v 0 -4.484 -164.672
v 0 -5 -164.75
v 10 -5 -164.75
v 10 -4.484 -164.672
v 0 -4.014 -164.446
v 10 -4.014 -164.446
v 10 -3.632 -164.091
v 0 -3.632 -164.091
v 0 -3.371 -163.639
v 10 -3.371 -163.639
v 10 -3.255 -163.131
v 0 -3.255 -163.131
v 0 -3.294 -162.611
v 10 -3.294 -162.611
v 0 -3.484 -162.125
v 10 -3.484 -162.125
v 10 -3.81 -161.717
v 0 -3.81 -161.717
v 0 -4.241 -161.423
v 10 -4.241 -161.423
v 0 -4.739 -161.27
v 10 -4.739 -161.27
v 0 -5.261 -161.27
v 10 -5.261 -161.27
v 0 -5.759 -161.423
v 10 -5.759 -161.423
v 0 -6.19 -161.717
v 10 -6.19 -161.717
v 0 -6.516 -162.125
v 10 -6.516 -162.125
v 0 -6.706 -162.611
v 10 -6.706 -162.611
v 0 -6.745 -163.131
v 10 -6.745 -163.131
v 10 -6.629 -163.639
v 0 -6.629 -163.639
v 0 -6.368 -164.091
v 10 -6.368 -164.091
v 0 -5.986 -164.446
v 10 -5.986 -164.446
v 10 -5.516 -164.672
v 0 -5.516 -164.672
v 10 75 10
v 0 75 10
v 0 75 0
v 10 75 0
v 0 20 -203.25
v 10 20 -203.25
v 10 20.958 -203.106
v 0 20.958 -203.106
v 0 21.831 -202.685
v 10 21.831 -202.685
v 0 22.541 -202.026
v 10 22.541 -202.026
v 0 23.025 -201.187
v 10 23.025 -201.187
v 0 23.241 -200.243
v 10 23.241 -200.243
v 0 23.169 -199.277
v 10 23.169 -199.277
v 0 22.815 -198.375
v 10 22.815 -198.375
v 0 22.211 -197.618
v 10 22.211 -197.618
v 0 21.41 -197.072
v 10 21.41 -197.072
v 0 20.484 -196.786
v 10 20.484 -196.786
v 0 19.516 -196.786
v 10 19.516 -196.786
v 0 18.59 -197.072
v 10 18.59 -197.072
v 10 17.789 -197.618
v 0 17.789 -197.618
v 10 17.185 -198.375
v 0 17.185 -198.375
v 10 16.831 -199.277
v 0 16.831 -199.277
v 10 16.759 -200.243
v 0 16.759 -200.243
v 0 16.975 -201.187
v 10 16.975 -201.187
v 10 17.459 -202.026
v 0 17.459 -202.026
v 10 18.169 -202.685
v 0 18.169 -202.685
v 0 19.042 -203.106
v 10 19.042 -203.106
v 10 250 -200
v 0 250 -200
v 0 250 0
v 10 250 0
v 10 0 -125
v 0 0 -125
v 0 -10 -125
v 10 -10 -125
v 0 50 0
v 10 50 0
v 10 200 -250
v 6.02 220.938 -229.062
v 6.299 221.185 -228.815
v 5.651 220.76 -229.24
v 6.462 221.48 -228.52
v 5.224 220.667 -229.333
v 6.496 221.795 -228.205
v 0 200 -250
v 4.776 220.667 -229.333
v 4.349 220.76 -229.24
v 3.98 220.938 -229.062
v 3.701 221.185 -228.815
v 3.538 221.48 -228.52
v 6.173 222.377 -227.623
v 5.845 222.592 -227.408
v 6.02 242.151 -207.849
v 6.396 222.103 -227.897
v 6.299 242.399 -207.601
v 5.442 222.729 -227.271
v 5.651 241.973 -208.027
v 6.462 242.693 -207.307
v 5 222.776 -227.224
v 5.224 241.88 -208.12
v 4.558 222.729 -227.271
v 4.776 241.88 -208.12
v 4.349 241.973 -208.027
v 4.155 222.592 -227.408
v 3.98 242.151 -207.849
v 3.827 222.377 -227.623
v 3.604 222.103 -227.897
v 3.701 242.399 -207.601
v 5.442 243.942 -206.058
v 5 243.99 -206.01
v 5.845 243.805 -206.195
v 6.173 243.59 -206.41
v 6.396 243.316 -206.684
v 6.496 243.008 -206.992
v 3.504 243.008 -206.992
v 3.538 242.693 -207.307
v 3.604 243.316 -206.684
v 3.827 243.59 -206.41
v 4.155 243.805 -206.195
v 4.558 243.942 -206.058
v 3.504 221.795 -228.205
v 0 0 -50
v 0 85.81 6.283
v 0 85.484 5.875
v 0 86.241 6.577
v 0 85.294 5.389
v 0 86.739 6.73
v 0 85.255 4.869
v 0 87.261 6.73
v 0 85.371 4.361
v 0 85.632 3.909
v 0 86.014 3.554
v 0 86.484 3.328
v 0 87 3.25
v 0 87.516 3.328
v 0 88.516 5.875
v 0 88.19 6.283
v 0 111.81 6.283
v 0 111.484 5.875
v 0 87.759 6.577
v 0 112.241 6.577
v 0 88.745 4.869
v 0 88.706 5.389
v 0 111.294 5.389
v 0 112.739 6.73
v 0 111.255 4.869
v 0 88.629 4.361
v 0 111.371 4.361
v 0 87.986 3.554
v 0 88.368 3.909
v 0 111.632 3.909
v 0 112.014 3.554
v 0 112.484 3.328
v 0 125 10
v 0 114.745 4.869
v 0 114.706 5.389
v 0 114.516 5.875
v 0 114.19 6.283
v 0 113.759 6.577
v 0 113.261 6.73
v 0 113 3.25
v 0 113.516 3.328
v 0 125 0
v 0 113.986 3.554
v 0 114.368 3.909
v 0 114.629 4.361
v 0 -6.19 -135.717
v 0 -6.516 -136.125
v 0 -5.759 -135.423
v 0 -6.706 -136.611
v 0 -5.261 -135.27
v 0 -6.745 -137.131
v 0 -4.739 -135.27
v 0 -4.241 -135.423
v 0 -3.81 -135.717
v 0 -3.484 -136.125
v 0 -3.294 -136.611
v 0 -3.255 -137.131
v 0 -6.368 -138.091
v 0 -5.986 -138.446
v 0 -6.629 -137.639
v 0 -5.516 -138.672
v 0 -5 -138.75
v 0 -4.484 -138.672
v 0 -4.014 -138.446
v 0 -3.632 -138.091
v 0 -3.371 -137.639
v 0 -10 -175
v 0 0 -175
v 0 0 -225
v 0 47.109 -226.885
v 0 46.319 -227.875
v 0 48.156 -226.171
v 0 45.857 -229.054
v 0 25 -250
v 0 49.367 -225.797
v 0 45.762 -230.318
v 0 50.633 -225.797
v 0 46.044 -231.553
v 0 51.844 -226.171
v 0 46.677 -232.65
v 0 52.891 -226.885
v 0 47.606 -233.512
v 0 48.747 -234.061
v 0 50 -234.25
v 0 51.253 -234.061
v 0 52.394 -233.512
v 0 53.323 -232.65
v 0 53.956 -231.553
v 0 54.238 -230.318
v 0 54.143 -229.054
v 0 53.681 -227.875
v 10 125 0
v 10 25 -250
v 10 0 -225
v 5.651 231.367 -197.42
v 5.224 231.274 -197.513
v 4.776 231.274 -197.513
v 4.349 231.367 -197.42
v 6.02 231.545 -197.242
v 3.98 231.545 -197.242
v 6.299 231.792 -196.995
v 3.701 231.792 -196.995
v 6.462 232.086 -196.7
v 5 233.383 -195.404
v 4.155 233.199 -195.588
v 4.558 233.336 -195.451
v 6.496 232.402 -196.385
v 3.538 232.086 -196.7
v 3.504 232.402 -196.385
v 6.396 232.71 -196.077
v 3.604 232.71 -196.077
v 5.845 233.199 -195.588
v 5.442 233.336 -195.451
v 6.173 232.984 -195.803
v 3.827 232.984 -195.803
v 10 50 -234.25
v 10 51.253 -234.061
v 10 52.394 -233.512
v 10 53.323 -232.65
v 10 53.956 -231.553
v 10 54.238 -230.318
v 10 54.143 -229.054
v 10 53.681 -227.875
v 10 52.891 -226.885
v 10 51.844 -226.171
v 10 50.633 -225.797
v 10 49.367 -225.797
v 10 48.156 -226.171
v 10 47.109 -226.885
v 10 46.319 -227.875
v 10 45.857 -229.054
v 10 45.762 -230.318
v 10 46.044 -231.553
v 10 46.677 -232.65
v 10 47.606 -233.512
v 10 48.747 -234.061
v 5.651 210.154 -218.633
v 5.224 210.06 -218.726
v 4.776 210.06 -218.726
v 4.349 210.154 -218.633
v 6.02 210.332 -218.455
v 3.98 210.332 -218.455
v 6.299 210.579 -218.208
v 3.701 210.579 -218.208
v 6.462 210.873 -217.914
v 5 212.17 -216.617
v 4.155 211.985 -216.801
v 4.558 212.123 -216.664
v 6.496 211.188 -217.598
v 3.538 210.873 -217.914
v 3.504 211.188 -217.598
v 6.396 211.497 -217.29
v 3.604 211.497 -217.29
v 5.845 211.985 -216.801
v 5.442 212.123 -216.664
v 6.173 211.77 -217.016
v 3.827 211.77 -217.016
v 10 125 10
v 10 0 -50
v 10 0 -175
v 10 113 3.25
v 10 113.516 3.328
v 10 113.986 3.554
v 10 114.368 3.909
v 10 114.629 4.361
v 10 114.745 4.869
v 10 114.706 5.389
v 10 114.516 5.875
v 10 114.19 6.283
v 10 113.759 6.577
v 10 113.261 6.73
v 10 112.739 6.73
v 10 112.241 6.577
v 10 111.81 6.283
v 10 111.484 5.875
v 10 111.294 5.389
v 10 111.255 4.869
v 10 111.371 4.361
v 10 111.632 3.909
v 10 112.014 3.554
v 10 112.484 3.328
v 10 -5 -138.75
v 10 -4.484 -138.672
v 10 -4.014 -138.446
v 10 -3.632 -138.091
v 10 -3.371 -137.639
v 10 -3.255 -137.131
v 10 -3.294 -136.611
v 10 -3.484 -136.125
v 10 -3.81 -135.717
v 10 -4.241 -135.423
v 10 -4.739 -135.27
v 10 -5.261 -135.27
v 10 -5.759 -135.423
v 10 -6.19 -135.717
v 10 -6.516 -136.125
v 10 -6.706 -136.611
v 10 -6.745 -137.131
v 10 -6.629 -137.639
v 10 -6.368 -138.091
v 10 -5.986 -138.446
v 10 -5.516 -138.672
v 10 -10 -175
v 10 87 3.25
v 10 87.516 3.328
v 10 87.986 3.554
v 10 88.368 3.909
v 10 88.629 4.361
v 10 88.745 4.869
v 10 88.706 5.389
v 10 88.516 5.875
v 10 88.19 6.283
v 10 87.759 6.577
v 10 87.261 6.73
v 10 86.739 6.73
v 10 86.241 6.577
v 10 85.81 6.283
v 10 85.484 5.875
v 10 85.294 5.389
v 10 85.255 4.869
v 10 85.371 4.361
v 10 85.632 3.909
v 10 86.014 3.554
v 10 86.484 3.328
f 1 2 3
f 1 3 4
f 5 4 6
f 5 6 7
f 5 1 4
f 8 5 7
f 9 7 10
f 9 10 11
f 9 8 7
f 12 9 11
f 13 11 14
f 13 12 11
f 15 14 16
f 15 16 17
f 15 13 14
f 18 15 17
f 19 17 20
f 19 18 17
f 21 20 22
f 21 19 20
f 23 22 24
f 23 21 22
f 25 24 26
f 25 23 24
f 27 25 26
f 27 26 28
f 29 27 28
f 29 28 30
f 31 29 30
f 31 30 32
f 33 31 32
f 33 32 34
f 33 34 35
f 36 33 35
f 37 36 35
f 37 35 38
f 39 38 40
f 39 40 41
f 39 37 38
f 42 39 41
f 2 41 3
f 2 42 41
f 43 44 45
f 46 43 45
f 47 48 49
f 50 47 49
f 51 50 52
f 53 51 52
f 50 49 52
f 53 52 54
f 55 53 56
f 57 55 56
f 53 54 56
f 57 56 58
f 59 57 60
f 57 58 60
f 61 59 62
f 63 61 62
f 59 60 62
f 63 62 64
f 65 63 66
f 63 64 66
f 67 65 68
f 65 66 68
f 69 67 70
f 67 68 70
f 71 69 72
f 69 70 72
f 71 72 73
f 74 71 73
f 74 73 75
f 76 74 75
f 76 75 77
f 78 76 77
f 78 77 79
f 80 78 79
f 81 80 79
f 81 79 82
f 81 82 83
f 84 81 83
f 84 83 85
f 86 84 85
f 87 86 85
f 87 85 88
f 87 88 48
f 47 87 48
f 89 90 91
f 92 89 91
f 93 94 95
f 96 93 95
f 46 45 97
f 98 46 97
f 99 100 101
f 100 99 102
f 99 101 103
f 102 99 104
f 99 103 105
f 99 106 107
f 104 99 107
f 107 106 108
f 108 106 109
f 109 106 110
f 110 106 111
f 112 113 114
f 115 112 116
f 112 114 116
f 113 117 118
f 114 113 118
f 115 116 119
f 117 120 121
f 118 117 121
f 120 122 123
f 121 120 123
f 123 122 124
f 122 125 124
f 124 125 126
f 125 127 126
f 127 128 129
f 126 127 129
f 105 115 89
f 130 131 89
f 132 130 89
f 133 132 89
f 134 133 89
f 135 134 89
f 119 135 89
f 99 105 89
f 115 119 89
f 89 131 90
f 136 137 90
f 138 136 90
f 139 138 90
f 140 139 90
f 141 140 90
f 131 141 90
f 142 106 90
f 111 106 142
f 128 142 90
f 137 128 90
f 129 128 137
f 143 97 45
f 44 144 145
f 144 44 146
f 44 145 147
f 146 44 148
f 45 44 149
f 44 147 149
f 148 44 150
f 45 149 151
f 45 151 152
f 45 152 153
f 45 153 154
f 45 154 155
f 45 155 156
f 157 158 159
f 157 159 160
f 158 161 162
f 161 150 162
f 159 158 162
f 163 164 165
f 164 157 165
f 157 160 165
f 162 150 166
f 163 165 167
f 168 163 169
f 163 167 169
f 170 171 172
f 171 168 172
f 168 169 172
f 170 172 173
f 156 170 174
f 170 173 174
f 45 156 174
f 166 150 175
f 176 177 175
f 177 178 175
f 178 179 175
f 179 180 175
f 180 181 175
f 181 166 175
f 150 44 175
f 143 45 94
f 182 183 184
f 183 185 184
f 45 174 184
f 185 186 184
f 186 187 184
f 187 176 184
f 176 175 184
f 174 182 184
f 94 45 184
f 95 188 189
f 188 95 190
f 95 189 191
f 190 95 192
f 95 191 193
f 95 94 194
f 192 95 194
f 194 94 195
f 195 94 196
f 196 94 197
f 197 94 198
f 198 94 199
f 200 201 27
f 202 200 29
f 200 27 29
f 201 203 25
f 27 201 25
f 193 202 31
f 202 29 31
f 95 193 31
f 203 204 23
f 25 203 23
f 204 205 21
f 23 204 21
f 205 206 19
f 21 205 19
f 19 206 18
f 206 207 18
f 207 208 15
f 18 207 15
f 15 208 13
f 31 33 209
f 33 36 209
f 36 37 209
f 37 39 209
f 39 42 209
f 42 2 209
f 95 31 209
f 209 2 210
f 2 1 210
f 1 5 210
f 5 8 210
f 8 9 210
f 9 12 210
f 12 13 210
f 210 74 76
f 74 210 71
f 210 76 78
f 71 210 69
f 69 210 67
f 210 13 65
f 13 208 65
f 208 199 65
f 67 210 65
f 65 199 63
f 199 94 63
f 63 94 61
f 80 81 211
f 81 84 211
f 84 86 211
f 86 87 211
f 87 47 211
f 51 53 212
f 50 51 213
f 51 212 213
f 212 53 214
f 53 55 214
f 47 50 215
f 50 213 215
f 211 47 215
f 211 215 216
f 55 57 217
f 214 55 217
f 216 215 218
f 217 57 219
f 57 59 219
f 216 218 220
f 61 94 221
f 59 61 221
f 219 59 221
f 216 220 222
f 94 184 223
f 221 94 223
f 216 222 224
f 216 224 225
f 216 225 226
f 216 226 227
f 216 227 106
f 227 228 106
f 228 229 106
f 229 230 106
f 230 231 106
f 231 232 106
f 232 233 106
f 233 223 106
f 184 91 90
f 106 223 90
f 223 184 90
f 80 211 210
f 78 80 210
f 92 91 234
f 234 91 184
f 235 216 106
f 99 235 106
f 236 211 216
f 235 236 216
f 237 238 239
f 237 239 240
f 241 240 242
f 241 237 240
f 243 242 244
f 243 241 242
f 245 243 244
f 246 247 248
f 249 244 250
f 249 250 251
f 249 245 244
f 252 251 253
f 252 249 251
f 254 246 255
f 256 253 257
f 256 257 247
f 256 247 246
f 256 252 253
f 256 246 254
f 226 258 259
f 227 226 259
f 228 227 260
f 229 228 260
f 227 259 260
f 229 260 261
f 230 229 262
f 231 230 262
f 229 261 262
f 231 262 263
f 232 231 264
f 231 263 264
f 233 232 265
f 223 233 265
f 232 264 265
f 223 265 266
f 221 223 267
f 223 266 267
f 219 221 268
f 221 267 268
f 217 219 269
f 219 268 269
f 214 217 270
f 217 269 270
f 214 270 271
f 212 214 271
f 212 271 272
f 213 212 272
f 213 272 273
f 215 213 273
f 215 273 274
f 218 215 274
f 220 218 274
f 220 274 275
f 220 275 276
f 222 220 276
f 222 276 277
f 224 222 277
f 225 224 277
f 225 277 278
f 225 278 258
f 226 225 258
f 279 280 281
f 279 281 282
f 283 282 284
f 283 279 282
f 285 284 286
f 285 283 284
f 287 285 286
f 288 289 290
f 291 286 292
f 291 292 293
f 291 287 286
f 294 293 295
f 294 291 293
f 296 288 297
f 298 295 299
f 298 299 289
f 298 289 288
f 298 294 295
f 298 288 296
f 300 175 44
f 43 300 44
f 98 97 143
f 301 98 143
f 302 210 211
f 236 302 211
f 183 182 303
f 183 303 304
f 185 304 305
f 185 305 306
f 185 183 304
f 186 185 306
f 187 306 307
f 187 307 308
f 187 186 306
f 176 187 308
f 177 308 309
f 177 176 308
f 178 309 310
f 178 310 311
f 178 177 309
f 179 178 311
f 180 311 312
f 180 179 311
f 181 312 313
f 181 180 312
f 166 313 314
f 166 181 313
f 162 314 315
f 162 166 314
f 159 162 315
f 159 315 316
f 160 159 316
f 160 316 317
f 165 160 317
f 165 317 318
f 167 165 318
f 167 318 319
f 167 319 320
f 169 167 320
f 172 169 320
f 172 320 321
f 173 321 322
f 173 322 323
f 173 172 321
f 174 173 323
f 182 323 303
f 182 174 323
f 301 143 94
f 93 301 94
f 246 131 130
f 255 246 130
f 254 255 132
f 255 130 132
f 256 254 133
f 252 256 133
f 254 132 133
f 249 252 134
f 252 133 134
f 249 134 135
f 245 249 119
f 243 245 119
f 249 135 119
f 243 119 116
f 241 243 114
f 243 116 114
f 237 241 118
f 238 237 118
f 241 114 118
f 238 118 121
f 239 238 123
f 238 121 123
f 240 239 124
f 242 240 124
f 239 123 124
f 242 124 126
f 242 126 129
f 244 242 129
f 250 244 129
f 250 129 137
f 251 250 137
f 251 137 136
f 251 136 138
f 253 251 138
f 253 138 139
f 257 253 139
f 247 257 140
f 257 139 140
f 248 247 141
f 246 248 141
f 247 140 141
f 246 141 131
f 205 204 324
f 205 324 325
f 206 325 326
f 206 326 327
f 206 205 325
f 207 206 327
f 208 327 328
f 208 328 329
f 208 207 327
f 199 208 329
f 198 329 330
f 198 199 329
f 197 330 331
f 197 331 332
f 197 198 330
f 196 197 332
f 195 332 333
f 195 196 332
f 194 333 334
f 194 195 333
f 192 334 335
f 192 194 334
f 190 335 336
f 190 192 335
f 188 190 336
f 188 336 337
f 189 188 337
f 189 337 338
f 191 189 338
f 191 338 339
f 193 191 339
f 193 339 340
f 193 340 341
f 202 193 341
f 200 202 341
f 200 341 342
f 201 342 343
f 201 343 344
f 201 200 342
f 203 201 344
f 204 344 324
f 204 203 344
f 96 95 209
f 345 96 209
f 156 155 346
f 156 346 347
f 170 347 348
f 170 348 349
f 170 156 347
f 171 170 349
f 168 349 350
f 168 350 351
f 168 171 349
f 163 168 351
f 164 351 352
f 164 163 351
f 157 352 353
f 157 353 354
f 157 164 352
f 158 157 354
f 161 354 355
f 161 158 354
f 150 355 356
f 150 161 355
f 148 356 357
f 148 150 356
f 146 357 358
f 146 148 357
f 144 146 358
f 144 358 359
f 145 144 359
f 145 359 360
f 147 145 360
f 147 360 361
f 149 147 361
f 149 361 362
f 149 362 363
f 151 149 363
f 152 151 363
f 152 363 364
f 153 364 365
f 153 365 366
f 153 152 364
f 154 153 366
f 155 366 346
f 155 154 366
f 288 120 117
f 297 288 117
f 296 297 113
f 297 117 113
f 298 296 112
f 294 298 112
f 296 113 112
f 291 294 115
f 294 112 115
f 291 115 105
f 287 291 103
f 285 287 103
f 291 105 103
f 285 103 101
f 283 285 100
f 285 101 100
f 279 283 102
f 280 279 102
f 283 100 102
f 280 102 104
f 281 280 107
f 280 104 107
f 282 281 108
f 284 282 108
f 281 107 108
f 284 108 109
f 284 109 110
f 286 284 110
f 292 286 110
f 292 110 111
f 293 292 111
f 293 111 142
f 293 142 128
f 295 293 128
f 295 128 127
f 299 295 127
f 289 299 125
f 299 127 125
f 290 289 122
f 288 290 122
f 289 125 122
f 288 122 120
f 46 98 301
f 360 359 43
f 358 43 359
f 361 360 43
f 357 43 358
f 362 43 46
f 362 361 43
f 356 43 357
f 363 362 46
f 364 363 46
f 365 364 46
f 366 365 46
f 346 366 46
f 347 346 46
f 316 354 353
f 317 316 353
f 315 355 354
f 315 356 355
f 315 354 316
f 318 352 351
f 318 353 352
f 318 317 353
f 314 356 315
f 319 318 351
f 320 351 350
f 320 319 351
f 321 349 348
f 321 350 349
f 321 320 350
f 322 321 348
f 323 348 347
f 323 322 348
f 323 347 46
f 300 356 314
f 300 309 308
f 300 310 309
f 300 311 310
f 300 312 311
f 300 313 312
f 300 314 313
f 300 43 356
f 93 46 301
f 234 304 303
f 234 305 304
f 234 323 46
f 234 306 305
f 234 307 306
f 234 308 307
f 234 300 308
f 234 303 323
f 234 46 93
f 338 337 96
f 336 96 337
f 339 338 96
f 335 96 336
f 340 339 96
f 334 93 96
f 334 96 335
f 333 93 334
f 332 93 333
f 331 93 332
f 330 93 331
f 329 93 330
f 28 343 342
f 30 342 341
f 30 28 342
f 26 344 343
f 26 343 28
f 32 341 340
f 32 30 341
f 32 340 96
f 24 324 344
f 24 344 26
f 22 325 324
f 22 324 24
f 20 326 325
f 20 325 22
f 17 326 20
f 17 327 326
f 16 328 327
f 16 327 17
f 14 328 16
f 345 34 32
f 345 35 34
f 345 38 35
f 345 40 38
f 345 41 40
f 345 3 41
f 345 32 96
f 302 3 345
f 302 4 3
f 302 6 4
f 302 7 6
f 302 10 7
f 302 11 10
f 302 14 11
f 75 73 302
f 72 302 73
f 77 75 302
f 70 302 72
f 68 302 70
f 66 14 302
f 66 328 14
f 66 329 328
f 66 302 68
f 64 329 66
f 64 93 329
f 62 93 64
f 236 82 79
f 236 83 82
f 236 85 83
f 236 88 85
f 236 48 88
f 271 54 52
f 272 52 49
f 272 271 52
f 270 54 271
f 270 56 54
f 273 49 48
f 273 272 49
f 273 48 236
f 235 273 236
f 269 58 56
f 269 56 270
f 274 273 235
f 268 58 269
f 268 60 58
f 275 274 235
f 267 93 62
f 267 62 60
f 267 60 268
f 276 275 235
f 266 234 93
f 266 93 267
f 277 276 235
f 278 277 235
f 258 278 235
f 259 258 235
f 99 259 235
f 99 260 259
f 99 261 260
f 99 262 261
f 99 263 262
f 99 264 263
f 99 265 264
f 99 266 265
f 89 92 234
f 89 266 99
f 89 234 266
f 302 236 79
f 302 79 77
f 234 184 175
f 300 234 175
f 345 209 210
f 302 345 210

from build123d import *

# Parameters (mm, degrees)
SKETCH1_R           = 1.75
BOSS_EXTRUDE1_DEPTH = 10
SKETCH2_R           = 1.5
CUT_EXTRUDE1_DEPTH  = 15
SKETCH3_R           = 4.25
SKETCH3_R_2         = 3.25
CUT_EXTRUDE2_DEPTH  = 354.694783677


with BuildPart() as part:
    # Sketch1 → Boss-Extrude1 (new body)
    with BuildSketch(Plane(origin=(0, 0, 0), x_dir=(0, 0, -1), z_dir=(1, 0, 0))):
        Polygon((50, 0), (125, 0), (125, -10), (175, -10), (175, 0), (225, 0), (250, 25), (250, 200), (200, 250), (0, 250), (0, 125), (-10, 125), (-10, 75), (0, 75), (0, 50), align=None)
        with Locations((-5, 113)):
            Circle(SKETCH1_R, mode=Mode.SUBTRACT)
        with Locations((-5, 87)):
            Circle(SKETCH1_R, mode=Mode.SUBTRACT)
        with Locations((137, -5)):
            Circle(SKETCH1_R, mode=Mode.SUBTRACT)
        with Locations((163, -5)):
            Circle(SKETCH1_R, mode=Mode.SUBTRACT)
    extrude(amount=BOSS_EXTRUDE1_DEPTH)

    # Sketch2 → Cut-Extrude1 (cut)
    with BuildSketch(Plane(origin=(0, 225, -225), x_dir=(1, 0, 0), z_dir=(0, 0.7071067811865477, -0.7071067811865475))):
        with Locations(Location((5, 4.644660941, 0), (0, 0, 270))):
            Circle(SKETCH2_R)
        with Locations(Location((5, -25.355339059, 0), (0, 0, 270))):
            Circle(SKETCH2_R)
    extrude(amount=-CUT_EXTRUDE1_DEPTH, mode=Mode.SUBTRACT)

    # Sketch3 → Cut-Extrude2 (cut, through all)
    with BuildSketch(Plane(origin=(10, 0, 0), x_dir=(0, 0, -1), z_dir=(1, 0, 0))):
        with Locations((230, 50)):
            Circle(SKETCH3_R)
        with Locations((200, 20)):
            Circle(SKETCH3_R_2)
    extrude(amount=-CUT_EXTRUDE2_DEPTH, mode=Mode.SUBTRACT)


solid = part.part
